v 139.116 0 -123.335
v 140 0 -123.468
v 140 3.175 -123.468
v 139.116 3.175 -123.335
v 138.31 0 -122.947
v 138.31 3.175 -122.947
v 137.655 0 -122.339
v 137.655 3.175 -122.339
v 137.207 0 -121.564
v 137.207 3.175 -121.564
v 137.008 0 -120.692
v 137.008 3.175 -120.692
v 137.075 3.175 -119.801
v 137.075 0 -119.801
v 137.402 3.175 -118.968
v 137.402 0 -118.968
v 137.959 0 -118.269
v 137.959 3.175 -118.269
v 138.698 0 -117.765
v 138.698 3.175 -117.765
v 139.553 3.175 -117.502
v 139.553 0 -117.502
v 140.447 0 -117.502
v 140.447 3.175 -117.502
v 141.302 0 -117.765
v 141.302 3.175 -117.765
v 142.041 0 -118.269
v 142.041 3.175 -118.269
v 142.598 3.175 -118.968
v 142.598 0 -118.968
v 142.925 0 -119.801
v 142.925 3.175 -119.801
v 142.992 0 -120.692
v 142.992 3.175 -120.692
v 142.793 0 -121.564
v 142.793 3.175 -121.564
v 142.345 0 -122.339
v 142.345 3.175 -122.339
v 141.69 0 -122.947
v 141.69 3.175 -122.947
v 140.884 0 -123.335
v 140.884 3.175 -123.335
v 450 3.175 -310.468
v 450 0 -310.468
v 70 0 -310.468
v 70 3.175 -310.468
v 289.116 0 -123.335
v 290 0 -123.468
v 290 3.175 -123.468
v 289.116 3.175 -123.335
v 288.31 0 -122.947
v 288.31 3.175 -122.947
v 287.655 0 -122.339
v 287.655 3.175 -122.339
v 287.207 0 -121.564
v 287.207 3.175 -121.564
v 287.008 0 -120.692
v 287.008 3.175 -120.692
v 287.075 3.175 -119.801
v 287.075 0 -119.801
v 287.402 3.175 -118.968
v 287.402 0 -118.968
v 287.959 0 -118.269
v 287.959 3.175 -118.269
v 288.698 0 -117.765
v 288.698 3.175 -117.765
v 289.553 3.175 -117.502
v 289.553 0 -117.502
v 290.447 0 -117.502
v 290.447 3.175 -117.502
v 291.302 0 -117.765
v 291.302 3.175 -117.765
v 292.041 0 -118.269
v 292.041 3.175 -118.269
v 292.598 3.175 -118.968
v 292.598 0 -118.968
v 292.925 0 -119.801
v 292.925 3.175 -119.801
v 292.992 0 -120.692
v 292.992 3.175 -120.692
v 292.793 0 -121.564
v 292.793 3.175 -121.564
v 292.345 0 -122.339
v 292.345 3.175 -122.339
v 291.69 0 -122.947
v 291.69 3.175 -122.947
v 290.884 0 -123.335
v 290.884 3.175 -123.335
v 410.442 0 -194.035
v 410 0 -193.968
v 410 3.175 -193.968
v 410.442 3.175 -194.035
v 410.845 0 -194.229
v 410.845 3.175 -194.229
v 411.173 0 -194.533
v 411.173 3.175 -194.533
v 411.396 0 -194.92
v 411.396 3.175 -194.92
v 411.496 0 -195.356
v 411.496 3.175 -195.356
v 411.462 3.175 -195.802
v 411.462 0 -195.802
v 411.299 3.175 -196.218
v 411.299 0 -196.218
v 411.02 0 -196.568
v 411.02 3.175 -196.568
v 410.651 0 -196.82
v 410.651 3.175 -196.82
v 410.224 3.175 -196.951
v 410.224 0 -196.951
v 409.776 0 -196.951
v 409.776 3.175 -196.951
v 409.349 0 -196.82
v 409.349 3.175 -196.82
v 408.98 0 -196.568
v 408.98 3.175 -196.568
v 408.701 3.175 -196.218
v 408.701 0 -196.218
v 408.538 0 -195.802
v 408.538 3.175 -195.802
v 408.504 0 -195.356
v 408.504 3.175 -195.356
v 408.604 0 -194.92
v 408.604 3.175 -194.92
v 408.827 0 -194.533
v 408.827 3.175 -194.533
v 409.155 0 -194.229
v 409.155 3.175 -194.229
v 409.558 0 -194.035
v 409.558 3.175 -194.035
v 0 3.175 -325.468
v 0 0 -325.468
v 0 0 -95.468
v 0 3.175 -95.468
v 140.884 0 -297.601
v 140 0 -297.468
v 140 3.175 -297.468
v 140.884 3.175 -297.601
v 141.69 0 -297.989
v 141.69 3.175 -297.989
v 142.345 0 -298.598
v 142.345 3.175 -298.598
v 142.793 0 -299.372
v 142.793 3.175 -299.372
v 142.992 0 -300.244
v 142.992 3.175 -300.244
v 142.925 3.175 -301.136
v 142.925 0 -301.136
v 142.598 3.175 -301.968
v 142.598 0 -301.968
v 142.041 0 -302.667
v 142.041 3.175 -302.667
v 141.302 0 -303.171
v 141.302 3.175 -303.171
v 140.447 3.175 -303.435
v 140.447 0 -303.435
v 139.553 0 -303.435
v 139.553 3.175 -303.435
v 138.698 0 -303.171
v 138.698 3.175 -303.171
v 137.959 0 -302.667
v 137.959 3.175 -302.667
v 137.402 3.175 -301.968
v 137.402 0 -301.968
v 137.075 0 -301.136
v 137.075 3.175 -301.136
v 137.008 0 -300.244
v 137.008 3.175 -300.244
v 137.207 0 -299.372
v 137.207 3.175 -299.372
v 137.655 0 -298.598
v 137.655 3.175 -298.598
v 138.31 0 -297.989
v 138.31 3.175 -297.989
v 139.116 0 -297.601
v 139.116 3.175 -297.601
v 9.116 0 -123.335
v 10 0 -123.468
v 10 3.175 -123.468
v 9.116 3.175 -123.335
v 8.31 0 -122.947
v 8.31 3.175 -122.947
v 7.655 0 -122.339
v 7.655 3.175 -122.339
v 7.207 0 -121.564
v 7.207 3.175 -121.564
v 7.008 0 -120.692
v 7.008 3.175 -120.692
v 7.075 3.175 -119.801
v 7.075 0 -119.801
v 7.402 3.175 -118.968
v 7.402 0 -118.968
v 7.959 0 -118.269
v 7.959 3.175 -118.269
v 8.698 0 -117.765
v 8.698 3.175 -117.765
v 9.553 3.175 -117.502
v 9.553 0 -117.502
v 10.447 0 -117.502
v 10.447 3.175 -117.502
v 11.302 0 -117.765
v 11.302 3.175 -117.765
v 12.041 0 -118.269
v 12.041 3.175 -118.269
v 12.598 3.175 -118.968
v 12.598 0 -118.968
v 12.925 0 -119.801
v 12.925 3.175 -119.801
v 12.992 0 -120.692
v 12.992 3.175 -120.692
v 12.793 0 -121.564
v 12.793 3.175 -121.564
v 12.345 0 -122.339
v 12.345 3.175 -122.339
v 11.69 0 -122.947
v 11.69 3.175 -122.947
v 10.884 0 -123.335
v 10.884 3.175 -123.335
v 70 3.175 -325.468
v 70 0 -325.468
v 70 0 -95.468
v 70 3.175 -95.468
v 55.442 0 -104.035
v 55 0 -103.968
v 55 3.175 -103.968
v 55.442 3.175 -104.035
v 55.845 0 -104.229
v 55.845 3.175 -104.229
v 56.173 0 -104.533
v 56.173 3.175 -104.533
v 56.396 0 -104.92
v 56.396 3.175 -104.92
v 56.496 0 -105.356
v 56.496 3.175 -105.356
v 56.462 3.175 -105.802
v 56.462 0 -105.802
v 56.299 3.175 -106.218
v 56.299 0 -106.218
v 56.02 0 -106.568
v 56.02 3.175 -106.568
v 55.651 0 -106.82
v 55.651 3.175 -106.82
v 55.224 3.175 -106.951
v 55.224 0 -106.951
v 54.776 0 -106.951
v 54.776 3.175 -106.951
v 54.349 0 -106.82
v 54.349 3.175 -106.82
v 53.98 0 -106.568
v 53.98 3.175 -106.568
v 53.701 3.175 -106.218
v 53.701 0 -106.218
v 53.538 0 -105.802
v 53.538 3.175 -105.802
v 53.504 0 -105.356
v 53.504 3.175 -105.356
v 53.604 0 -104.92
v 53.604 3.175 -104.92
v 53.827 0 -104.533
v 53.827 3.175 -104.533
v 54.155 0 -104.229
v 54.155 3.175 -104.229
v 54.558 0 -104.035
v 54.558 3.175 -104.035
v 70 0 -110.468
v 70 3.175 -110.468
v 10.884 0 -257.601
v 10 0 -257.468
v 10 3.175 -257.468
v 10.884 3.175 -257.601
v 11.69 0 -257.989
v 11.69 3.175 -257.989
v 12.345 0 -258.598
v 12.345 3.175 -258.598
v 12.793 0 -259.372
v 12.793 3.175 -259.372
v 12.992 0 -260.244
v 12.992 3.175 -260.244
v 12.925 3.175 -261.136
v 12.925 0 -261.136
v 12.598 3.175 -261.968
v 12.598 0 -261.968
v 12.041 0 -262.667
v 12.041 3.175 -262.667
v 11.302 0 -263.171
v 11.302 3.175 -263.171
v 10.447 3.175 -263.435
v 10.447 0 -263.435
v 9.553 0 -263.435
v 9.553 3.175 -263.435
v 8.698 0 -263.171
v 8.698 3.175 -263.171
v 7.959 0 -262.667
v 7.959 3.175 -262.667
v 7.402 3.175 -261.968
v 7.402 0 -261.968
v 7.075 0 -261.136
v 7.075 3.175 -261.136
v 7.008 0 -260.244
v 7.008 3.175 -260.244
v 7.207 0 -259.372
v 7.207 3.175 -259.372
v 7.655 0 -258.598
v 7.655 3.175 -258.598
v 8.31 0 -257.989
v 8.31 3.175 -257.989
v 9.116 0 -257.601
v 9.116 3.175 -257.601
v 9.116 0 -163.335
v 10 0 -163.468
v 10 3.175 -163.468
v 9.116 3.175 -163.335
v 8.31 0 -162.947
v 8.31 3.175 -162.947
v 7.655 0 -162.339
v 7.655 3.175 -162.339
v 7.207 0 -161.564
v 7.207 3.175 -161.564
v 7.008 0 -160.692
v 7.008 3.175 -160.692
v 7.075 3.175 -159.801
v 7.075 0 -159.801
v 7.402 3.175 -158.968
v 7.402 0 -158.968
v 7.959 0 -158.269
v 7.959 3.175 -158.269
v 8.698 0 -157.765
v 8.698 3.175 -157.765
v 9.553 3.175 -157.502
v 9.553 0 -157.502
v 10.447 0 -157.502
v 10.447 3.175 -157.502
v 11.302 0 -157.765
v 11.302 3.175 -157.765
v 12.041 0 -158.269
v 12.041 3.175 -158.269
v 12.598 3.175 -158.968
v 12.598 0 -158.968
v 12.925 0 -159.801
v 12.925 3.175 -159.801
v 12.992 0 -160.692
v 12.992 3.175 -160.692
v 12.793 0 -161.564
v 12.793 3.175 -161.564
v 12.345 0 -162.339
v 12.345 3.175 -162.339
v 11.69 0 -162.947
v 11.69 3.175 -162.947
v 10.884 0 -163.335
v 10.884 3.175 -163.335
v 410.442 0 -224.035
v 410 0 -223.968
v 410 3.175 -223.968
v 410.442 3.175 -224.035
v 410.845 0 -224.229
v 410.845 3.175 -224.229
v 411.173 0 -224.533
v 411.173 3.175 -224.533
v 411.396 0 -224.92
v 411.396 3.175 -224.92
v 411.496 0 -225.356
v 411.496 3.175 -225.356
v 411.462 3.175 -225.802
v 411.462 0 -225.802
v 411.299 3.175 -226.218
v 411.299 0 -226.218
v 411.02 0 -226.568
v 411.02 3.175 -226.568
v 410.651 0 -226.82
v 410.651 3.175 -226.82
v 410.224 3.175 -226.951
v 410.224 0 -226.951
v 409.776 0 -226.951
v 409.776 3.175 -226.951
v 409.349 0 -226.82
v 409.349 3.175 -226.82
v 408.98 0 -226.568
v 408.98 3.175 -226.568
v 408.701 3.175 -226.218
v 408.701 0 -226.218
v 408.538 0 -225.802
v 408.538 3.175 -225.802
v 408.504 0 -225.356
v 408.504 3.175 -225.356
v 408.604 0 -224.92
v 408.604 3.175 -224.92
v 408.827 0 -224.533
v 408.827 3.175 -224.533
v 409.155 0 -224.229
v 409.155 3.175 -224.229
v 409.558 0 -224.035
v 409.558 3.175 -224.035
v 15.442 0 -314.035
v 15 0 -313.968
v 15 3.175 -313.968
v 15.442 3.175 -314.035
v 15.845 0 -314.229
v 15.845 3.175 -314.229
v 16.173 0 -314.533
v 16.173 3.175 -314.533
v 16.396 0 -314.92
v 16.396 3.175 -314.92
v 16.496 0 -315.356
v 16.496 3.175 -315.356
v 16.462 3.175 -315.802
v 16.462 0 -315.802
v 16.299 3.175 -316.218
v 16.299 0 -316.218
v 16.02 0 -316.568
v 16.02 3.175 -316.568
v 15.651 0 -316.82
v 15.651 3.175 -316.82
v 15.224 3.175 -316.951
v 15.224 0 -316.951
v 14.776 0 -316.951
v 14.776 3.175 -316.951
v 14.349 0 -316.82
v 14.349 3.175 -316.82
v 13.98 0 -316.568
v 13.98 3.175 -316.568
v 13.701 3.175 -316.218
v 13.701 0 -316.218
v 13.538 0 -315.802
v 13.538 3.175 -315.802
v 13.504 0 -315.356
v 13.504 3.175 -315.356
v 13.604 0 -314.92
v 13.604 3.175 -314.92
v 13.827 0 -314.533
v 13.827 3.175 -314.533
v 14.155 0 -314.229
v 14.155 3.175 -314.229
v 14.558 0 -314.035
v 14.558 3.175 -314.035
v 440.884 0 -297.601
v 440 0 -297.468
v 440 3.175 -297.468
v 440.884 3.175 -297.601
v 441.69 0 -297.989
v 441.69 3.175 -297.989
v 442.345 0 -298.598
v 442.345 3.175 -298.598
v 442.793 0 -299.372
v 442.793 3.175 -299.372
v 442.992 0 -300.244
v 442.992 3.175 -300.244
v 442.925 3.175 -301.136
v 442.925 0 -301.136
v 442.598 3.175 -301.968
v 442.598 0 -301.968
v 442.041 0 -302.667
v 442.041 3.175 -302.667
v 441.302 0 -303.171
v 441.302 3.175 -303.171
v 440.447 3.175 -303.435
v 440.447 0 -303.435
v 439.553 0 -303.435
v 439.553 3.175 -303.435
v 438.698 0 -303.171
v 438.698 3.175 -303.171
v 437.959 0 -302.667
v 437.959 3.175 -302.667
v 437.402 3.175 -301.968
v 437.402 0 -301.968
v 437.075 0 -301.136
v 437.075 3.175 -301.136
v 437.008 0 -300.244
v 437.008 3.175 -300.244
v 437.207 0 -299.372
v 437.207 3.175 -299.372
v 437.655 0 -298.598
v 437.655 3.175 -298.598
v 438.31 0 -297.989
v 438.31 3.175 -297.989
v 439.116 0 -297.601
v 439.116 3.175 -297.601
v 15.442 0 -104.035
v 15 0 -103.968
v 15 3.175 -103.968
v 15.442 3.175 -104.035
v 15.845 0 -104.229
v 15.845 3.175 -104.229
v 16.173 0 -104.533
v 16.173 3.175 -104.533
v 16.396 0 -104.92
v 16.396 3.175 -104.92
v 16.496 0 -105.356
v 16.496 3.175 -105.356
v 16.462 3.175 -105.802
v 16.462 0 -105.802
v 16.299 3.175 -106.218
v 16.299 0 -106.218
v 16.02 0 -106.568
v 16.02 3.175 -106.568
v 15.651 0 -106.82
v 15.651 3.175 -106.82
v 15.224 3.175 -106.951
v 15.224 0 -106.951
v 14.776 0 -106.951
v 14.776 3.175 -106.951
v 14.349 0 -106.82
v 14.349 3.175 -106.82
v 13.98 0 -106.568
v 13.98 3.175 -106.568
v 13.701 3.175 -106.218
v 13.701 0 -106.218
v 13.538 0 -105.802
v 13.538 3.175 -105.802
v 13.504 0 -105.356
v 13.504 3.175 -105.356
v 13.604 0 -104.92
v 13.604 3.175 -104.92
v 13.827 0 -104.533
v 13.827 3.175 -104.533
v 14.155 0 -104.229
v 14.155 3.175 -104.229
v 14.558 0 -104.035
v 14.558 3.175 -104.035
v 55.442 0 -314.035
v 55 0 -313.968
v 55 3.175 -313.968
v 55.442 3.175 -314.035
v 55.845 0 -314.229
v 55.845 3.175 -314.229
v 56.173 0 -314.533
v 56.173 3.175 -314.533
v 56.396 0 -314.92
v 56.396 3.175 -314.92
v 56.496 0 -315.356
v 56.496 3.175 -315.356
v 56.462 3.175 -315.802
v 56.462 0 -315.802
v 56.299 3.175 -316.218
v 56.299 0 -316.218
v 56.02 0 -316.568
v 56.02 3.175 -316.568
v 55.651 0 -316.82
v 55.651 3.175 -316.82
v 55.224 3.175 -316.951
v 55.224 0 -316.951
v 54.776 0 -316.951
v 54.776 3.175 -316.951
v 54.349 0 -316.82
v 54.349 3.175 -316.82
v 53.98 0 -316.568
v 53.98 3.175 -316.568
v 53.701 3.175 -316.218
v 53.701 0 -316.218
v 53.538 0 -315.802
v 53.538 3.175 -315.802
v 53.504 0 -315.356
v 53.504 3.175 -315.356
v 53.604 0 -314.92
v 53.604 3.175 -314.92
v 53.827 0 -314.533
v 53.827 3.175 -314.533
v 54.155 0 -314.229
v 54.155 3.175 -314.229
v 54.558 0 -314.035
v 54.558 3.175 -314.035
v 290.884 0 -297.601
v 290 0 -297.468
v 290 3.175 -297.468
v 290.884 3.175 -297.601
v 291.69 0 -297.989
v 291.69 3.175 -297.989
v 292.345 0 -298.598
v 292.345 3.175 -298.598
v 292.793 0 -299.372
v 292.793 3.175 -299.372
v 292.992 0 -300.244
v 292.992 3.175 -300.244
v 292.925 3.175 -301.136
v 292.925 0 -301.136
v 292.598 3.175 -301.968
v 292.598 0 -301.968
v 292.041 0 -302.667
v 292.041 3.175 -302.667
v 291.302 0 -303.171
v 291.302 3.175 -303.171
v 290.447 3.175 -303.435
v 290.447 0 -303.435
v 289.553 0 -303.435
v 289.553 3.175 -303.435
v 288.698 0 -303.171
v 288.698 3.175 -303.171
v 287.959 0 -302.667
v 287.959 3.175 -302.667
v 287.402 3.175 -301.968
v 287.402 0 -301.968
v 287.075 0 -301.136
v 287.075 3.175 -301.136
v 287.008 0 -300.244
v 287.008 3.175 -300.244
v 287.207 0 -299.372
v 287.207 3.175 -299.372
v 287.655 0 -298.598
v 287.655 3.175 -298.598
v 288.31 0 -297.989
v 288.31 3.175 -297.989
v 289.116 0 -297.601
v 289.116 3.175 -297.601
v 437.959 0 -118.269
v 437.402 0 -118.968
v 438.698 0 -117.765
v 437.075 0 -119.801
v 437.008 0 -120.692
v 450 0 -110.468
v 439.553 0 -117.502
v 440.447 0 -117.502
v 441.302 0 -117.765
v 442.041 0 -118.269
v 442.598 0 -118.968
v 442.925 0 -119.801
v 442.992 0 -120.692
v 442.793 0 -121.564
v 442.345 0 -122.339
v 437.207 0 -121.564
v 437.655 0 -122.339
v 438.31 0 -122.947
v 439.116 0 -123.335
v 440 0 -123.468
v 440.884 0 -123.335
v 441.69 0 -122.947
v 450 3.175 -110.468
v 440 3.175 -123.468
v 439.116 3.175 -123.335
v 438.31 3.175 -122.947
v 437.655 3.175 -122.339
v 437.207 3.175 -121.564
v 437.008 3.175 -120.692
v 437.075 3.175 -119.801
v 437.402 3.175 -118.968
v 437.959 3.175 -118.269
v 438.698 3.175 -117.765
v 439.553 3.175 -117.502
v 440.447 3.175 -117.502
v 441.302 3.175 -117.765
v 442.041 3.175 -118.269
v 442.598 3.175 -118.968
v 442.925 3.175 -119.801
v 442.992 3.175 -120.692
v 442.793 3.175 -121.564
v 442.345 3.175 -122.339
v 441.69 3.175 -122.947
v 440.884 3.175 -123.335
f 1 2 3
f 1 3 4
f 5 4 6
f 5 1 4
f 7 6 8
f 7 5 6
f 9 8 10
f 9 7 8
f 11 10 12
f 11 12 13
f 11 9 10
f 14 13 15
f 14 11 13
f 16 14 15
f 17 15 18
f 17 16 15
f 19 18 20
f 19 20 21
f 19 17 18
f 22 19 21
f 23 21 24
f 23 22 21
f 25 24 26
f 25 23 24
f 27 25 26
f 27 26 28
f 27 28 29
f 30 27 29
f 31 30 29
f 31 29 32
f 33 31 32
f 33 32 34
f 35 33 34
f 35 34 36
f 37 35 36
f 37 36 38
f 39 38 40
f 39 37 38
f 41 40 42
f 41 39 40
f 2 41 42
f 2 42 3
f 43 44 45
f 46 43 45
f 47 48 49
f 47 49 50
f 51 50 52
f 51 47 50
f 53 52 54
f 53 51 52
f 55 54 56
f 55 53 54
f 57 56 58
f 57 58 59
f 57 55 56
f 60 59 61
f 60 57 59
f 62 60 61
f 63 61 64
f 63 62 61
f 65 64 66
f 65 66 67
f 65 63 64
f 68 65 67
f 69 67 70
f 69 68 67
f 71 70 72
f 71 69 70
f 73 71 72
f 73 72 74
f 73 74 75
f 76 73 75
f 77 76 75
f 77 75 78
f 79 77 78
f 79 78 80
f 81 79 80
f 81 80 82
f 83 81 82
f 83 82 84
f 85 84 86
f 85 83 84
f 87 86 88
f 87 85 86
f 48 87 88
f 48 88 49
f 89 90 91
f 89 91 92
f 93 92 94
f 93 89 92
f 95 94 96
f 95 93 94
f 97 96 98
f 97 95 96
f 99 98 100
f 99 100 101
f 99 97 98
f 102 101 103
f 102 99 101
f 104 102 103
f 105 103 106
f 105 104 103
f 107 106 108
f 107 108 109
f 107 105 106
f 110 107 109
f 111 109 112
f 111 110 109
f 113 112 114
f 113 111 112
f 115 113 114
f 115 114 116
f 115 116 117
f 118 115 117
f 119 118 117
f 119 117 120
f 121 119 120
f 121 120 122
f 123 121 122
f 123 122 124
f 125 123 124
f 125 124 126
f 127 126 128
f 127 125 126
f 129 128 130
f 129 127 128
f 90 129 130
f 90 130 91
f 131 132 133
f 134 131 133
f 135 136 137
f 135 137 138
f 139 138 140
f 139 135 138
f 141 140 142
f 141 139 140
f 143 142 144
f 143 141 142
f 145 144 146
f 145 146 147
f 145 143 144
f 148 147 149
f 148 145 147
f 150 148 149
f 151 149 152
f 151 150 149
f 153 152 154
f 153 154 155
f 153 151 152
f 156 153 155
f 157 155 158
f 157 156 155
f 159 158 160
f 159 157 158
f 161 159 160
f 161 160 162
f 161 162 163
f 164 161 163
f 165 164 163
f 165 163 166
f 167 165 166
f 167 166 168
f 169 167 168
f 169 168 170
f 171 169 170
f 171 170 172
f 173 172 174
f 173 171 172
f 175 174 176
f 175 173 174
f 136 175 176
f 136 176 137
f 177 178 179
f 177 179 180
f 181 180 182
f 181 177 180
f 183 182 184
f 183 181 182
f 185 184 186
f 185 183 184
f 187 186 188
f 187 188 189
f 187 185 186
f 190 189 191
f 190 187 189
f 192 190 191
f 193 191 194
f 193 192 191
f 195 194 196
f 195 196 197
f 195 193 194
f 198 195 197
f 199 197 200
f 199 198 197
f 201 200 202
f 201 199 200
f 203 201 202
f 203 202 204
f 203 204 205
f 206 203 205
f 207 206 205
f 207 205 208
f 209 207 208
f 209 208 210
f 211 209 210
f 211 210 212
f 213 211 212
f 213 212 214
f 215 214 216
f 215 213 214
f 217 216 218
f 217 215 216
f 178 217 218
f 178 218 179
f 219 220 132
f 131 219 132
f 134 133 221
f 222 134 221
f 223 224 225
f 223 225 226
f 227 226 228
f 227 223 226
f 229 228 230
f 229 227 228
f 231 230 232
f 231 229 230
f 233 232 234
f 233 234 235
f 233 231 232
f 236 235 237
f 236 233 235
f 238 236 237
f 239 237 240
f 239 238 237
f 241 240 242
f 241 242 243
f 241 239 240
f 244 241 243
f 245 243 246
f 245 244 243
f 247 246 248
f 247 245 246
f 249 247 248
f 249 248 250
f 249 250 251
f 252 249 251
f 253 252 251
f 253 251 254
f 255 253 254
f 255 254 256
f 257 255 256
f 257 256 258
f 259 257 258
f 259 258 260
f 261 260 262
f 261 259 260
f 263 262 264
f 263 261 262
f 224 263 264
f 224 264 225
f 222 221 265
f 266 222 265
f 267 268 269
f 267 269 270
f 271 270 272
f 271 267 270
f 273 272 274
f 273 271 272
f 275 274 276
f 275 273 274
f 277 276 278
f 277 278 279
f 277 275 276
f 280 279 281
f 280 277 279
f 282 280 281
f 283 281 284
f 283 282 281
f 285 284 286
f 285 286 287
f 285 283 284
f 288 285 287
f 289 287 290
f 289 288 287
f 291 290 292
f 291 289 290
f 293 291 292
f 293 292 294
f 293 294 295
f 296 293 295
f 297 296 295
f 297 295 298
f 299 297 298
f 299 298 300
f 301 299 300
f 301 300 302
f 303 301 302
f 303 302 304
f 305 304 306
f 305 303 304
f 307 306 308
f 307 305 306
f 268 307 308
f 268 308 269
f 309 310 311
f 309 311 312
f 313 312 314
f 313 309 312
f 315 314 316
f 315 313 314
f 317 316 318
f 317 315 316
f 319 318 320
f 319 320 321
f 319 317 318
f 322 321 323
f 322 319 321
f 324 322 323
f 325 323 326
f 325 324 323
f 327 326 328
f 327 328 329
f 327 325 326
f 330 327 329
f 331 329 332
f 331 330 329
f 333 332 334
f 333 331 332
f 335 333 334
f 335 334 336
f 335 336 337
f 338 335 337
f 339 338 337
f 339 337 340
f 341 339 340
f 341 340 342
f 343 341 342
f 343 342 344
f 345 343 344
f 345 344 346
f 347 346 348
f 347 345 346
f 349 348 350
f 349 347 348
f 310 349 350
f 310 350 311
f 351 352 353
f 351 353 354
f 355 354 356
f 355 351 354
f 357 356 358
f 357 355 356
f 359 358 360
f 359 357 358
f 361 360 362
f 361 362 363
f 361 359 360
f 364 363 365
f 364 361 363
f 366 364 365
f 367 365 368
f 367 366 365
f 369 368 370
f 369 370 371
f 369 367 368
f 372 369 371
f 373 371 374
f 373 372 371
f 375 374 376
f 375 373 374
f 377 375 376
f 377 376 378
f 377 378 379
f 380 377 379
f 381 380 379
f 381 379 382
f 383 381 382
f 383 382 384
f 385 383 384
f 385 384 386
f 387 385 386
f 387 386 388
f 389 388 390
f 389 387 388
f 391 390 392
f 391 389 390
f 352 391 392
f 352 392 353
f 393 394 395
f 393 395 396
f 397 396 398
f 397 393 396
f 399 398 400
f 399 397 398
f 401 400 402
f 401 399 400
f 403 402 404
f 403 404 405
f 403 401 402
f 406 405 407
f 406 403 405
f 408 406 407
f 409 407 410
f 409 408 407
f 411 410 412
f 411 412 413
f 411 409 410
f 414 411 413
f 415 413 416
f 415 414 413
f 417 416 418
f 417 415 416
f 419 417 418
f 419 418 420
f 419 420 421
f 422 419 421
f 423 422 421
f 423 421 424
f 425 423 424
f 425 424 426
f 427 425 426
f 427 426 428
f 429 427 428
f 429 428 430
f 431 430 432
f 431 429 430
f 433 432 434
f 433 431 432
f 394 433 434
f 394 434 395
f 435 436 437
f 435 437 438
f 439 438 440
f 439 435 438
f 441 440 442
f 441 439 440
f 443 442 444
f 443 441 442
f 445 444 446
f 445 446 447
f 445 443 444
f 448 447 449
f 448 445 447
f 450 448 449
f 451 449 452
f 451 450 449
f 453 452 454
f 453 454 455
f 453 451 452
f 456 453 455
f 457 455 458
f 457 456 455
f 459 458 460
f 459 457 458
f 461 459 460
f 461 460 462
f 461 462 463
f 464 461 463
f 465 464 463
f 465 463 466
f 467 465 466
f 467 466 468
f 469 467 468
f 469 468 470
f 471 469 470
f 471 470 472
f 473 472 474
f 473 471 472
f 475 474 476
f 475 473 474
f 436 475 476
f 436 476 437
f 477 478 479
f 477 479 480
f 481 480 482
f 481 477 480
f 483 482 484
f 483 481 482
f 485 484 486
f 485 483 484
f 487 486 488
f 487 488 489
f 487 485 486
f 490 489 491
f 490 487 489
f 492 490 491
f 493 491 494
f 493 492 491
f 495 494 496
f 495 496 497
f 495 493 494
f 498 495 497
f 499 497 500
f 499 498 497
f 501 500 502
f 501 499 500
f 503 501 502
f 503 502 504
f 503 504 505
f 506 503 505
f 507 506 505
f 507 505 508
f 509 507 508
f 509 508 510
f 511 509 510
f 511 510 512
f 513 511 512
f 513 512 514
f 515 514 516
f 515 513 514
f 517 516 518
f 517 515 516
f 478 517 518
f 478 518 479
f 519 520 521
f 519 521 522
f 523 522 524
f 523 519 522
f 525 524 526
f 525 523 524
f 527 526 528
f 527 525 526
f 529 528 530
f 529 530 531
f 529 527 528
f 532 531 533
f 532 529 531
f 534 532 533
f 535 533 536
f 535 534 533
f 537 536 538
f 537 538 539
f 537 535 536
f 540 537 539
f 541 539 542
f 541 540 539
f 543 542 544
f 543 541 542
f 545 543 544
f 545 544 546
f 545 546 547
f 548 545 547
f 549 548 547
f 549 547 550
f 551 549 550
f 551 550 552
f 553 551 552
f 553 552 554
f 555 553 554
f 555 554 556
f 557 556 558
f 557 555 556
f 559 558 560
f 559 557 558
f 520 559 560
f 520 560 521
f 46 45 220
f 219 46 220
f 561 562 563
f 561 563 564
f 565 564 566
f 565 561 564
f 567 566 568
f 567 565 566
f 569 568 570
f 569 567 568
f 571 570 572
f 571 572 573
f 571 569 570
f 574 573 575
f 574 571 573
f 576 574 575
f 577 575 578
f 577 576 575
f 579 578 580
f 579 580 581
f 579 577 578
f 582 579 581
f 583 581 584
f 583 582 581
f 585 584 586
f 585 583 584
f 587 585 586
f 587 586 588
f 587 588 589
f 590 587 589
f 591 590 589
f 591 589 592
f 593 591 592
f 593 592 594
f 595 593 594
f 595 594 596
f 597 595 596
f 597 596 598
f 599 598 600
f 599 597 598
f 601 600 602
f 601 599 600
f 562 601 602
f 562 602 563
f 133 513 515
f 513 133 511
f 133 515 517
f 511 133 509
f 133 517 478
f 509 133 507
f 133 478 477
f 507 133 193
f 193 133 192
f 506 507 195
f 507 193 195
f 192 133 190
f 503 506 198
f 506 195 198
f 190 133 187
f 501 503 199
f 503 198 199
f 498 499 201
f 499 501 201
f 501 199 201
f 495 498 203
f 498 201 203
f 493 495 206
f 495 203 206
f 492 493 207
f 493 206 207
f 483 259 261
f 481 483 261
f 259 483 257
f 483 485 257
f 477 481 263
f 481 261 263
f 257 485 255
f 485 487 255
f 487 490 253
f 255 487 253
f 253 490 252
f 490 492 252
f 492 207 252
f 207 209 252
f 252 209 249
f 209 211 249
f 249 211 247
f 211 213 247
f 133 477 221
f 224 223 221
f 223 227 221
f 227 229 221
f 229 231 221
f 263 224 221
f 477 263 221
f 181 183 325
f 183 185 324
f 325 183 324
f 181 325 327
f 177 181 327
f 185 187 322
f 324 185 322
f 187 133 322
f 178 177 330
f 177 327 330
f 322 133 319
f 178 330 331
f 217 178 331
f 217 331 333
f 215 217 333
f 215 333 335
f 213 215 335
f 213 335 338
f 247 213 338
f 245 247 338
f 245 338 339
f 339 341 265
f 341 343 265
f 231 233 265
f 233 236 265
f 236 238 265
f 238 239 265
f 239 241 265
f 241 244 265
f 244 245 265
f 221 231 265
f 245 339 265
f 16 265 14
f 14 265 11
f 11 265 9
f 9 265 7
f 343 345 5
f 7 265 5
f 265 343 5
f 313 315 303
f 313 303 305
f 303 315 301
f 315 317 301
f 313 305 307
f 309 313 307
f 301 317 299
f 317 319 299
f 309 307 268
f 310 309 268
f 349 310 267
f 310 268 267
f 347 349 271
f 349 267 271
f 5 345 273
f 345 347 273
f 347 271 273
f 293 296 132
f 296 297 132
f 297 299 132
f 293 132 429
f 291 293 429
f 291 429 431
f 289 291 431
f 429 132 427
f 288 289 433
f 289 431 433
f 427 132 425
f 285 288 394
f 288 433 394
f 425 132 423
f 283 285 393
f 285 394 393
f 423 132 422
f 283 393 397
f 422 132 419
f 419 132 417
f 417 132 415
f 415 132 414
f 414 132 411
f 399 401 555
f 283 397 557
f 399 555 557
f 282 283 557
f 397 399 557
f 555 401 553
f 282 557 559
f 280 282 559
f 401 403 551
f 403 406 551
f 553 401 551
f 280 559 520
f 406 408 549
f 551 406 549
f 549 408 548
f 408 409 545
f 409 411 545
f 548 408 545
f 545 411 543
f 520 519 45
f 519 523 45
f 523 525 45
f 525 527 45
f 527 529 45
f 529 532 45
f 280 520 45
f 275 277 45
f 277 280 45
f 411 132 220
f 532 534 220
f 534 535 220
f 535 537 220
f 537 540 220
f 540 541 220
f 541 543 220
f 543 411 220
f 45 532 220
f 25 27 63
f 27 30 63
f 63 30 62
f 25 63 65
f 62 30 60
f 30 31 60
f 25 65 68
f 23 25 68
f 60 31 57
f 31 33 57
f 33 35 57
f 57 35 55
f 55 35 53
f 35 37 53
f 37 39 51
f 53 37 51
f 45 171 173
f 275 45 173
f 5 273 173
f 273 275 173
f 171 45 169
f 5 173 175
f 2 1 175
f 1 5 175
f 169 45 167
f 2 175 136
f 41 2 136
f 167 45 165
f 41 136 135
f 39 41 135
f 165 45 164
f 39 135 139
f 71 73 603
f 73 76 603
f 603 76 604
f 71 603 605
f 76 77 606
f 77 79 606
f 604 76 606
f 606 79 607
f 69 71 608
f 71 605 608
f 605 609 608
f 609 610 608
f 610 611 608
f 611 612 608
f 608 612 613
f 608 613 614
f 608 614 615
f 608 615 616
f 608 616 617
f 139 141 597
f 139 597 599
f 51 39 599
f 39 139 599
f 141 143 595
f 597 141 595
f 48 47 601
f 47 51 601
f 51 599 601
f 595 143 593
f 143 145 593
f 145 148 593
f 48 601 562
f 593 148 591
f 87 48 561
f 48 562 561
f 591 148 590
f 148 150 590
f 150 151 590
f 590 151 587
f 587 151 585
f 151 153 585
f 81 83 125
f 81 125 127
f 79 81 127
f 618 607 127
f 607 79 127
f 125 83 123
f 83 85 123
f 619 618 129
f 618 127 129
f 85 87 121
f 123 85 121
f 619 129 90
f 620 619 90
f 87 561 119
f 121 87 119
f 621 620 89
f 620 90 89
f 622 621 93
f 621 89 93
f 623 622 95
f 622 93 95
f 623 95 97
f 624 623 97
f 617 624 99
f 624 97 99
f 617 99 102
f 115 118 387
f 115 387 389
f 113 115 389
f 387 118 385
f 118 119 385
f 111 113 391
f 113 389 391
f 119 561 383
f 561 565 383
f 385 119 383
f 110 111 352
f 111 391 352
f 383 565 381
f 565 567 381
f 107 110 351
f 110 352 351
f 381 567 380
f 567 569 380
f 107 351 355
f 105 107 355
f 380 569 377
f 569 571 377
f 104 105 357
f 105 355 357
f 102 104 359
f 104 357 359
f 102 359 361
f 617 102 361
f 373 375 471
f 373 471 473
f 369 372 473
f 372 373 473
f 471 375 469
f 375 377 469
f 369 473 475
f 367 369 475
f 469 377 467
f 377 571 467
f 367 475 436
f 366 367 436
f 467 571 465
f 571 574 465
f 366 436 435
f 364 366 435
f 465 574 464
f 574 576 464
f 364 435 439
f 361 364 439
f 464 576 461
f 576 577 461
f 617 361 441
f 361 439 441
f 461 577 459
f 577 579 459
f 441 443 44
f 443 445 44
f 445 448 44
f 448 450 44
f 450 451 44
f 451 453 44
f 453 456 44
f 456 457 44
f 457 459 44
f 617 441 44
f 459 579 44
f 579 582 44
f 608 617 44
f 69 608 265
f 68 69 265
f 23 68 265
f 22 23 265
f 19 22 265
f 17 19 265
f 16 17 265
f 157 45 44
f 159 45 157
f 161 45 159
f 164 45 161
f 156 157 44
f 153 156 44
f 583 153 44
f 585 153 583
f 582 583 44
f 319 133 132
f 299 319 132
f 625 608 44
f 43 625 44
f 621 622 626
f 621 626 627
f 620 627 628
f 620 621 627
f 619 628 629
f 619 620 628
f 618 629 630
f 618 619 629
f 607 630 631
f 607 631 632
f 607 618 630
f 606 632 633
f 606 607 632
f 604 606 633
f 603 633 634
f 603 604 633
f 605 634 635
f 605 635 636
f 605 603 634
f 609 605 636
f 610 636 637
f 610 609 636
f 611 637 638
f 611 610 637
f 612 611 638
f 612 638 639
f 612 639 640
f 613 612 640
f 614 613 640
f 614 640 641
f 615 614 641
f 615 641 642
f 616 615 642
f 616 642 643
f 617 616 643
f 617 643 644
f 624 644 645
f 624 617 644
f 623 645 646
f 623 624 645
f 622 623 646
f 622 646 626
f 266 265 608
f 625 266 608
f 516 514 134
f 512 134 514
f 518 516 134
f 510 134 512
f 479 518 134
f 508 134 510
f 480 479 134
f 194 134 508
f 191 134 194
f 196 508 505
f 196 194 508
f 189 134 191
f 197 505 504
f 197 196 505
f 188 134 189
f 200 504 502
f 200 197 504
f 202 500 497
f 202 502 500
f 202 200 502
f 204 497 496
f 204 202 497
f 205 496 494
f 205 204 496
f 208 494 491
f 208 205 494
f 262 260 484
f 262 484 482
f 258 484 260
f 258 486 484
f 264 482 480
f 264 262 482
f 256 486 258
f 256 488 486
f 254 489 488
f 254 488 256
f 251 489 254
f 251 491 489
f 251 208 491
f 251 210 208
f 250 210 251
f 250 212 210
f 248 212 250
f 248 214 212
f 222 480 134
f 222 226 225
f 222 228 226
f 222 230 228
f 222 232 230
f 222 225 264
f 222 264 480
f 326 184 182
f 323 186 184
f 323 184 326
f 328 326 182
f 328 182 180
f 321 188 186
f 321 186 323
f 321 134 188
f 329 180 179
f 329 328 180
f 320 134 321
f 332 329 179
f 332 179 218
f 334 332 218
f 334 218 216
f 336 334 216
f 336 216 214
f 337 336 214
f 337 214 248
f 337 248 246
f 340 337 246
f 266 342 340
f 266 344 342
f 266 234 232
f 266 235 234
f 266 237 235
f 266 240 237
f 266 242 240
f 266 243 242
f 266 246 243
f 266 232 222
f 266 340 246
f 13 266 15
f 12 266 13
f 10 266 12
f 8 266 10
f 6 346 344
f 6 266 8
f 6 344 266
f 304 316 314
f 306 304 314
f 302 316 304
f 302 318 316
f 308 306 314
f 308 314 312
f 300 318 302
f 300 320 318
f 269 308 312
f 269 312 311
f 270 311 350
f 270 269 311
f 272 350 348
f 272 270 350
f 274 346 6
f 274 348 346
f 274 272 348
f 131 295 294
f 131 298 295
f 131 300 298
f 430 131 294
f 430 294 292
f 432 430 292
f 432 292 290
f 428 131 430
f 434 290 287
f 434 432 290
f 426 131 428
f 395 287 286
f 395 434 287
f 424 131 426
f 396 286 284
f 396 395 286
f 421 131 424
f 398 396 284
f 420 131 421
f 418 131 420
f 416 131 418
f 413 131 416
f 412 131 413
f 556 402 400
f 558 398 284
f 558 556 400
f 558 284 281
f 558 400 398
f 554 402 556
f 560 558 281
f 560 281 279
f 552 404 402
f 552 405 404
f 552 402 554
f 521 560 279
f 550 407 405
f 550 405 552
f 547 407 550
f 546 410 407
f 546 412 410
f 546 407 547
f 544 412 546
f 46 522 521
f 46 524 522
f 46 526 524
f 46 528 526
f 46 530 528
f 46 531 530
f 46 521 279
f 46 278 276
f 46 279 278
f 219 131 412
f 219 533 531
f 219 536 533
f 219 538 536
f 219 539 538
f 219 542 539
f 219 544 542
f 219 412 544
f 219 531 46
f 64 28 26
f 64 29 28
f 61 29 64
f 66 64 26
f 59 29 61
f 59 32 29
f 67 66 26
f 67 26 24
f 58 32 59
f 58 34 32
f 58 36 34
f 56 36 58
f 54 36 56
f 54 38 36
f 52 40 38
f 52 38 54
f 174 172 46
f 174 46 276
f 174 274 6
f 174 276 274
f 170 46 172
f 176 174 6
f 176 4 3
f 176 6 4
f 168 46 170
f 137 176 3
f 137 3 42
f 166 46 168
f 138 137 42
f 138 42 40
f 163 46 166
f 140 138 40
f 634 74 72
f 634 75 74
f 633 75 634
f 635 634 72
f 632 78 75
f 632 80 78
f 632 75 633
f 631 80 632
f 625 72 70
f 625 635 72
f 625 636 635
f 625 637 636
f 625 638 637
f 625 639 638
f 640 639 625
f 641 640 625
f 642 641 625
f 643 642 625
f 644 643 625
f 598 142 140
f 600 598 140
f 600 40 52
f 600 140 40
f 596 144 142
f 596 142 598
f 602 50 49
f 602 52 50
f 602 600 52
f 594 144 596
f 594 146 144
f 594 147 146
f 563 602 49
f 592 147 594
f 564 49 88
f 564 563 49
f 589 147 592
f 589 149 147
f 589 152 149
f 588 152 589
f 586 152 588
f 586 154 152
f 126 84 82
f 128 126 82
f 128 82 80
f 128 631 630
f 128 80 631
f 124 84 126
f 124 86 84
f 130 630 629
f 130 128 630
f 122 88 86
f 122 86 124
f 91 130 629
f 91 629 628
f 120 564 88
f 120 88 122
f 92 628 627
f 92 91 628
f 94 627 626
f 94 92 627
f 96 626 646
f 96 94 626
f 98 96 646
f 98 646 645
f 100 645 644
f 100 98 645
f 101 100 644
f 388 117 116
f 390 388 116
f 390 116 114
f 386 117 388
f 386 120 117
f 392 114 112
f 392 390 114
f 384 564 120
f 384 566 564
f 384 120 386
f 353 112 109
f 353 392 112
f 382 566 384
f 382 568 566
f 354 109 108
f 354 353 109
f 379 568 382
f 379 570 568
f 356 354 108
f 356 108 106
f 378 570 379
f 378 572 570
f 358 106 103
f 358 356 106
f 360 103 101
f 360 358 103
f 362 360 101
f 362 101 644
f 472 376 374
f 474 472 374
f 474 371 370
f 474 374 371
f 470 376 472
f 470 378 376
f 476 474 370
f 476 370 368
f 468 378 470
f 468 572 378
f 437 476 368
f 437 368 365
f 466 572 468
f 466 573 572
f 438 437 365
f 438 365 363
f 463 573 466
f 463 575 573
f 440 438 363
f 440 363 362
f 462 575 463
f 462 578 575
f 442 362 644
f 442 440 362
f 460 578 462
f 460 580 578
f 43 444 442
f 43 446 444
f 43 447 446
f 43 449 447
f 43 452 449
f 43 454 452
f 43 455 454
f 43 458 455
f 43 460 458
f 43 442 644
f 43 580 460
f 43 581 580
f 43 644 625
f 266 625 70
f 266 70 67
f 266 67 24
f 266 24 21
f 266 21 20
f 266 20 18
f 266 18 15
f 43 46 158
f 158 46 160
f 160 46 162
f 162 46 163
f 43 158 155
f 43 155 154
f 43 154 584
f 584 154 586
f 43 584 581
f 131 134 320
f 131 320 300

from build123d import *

# Parameters (mm, degrees)
SKETCH1_R           = 1.5
SKETCH1_R_2         = 3
BOSS_EXTRUDE1_DEPTH = 3.175


with BuildPart() as part:
    # Sketch1 → Boss-Extrude1 (new body)
    with BuildSketch(Plane(origin=(0, 0, 0), x_dir=(1, 0, 0), z_dir=(0, 1, 0))):
        Polygon((70, 110.468098835), (450, 110.468098835), (450, 310.468098835), (70, 310.468098835), (70, 325.468098835), (0, 325.468098835), (0, 95.468098835), (70, 95.468098835), align=None)
        with Locations(Location((55, 315.468098835, 0), (0, 0, 270))):
            Circle(SKETCH1_R, mode=Mode.SUBTRACT)
        with Locations(Location((15, 315.468098835, 0), (0, 0, 270))):
            Circle(SKETCH1_R, mode=Mode.SUBTRACT)
        with Locations(Location((55, 105.468098835, 0), (0, 0, 270))):
            Circle(SKETCH1_R, mode=Mode.SUBTRACT)
        with Locations(Location((15, 105.468098835, 0), (0, 0, 270))):
            Circle(SKETCH1_R, mode=Mode.SUBTRACT)
        with Locations(Location((410, 225.468098835, 0), (0, 0, 270))):
            Circle(SKETCH1_R, mode=Mode.SUBTRACT)
        with Locations(Location((410, 195.468098835, 0), (0, 0, 270))):
            Circle(SKETCH1_R, mode=Mode.SUBTRACT)
        with Locations(Location((10, 260.468098835, 0), (0, 0, 270))):
            Circle(SKETCH1_R_2, mode=Mode.SUBTRACT)
        with Locations(Location((440, 300.468098835, 0), (0, 0, 270))):
            Circle(SKETCH1_R_2, mode=Mode.SUBTRACT)
        with Locations(Location((140, 300.468098835, 0), (0, 0, 270))):
            Circle(SKETCH1_R_2, mode=Mode.SUBTRACT)
        with Locations(Location((290, 300.468098835, 0), (0, 0, 270))):
            Circle(SKETCH1_R_2, mode=Mode.SUBTRACT)
        with Locations(Location((440, 120.468098835, 0), (0, 0, 90))):
            Circle(SKETCH1_R_2, mode=Mode.SUBTRACT)
        with Locations(Location((290, 120.468098835, 0), (0, 0, 90))):
            Circle(SKETCH1_R_2, mode=Mode.SUBTRACT)
        with Locations(Location((140, 120.468098835, 0), (0, 0, 90))):
            Circle(SKETCH1_R_2, mode=Mode.SUBTRACT)
        with Locations(Location((10, 120.468098835, 0), (0, 0, 90))):
            Circle(SKETCH1_R_2, mode=Mode.SUBTRACT)
        with Locations(Location((10, 160.468098835, 0), (0, 0, 90))):
            Circle(SKETCH1_R_2, mode=Mode.SUBTRACT)
    extrude(amount=BOSS_EXTRUDE1_DEPTH)


solid = part.part
